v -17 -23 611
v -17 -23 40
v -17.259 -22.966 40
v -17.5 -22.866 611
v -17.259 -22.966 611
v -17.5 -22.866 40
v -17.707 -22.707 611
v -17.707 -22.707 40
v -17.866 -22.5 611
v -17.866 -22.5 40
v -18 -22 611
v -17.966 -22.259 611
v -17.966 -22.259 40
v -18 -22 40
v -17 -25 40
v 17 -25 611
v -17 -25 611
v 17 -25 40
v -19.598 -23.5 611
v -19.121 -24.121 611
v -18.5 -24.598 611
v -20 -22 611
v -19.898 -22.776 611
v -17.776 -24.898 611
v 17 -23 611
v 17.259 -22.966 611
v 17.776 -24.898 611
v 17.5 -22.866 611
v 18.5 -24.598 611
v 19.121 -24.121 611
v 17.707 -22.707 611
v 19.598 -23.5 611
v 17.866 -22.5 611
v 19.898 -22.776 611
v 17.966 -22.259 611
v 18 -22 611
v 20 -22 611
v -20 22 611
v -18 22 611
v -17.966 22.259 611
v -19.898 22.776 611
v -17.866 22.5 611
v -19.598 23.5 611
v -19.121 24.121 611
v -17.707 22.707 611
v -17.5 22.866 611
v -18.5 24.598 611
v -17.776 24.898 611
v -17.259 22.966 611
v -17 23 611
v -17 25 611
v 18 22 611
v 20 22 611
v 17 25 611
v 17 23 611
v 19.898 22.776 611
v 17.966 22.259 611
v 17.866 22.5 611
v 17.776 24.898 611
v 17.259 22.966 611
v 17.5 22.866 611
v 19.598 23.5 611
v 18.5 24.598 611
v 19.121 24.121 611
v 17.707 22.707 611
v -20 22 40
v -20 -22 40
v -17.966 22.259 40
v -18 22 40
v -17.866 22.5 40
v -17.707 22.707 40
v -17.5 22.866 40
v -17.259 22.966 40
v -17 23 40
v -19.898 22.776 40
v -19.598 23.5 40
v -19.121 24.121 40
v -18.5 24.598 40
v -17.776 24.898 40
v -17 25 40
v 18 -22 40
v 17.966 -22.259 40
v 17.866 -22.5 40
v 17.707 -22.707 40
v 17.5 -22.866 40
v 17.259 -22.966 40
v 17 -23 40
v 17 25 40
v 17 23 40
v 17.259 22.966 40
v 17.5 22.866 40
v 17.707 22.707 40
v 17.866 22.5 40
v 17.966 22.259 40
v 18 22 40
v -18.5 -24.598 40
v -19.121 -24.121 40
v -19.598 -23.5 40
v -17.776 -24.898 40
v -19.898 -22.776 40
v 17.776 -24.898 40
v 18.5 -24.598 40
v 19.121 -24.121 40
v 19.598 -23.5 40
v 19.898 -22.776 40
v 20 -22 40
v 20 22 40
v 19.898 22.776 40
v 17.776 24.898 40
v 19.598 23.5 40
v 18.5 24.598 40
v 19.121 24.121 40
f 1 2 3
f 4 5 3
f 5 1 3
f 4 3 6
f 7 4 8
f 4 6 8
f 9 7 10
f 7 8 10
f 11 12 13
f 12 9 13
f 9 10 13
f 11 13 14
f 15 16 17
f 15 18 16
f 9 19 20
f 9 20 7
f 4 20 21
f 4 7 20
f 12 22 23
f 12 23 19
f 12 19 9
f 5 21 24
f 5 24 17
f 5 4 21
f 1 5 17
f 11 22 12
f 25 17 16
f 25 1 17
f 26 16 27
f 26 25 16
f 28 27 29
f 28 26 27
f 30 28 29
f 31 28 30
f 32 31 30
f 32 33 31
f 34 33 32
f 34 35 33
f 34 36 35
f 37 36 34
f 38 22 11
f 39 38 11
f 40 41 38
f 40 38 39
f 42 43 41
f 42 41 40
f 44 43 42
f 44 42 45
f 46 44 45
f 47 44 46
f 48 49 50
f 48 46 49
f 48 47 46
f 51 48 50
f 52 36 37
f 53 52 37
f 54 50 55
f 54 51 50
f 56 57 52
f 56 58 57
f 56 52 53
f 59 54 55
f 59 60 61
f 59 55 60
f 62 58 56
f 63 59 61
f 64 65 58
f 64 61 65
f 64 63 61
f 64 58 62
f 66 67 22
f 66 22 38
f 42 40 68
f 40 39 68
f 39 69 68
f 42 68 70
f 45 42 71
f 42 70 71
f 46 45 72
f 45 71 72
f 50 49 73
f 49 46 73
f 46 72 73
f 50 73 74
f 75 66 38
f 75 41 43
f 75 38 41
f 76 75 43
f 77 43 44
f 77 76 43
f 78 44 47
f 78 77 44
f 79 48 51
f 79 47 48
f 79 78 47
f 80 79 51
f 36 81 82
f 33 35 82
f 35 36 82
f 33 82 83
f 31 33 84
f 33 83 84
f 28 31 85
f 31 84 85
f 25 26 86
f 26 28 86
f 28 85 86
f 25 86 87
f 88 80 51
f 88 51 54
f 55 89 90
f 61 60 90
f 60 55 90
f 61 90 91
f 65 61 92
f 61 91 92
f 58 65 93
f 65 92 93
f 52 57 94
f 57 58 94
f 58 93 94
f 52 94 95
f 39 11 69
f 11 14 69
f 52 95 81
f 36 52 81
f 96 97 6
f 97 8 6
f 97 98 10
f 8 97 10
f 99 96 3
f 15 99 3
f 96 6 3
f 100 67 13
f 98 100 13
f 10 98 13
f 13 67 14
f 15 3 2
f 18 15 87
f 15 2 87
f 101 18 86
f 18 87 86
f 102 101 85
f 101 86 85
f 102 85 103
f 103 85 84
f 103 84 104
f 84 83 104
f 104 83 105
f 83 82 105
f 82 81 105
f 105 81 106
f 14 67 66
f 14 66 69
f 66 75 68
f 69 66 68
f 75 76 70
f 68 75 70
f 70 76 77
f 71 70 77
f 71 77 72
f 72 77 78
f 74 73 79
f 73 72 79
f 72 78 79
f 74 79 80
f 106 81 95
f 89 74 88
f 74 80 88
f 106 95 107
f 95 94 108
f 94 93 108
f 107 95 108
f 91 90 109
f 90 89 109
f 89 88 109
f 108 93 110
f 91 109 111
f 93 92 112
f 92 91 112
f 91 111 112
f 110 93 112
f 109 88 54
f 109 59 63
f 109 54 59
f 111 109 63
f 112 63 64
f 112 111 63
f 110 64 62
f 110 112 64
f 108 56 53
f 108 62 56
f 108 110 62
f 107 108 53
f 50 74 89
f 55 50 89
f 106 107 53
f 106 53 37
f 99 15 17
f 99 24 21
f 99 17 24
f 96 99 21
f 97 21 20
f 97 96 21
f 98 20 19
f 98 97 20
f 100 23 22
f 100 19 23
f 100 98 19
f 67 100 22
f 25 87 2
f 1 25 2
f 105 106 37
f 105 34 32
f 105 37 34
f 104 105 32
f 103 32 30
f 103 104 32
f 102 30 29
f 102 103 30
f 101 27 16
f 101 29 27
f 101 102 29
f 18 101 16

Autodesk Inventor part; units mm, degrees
ref_plane "Start plane" through (0, 0, 40) normal (0, 0, 1) x (1, 0, 0)
ref_plane "End plane" through (0, 0, 611) normal (0, 0, 1) x (1, 0, 0)
sketch "Sketch" plane through (0, 0, 0) normal (0, 0, 1) x (1, 0, 0)
  line L0 (-20, -22) -> (-20, 22)
  line L1 (-17, 25) -> (17, 25)
  line L2 (20, 22) -> (20, -22)
  line L3 (17, -25) -> (-17, -25)
  arc A0 (-20, -22) -> (-17, -25) centre (-17, -22) ccw
  arc A1 (-17, 25) -> (-20, 22) centre (-17, 22) ccw
  arc A2 (20, 22) -> (17, 25) centre (17, 22) ccw
  arc A3 (17, -25) -> (20, -22) centre (17, -22) ccw
  arc A4 (-17, 23) -> (-18, 22) centre (-17, 22) ccw
  line L4 (-17, 23) -> (17, 23)
  arc A5 (18, 22) -> (17, 23) centre (17, 22) ccw
  line L5 (18, 22) -> (18, -22)
  arc A6 (17, -23) -> (18, -22) centre (17, -22) ccw
  line L6 (17, -23) -> (-17, -23)
  arc A7 (-18, -22) -> (-17, -23) centre (-17, -22) ccw
  line L7 (-18, -22) -> (-18, 22)
  line L8 (0, 35.8698) -> (0, -35.8698) construction
  line L9 (-28.8698, 0) -> (28.8698, 0) construction
  dimension "d7" = 3
  dimension "d10" = 50
  dimension "d11" = 40
  dimension "d12" = 2
  dimension "d15" = 25
  dimension "d16" = 20
extrude "Body" add sketch "Sketch" along normal up to surface (571 mm away) from surface at 40
sketch "Sketch3" plane through (0, 0, 0) normal (0, 0, 1) x (1, 0, 0)
  line L0 (0, 0) -> (10, 0)
ref_plane "Work Plane3" through (0, 0, 0) normal (0, -1, 0) x (1, 0, 0)
sketch "Sketch4" plane through (0, 0, 0) normal (0, -1, 0) x (1, 0, 0)
  line L0 (-2, 40) -> (12, 40)
  line L1 (-2, 611) -> (12, 611)
  dimension "d18" = 571
ref_plane "Work Plane4" through (20, 22, 40) normal (0, 0, -1) x (-1, 0, 0)
split "Split1" plane through (20, 22, 40) removes the side toward (0, 0, -1)
ref_plane "Work Plane5" through (20, -22, 611) normal (0, 0, 1) x (1, 0, 0)
split "Split2" plane through (20, -22, 611) removes the side toward (0, 0, 1)
equation "\"d7\" = G_IR"
equation "\"d10\" = G_H"
equation "\"d11\" = G_W"
equation "\"d12\" = G_T"
equation "\"d15\" = 0.5 * d10"
equation "\"d16\" = 0.5 * d11"
equation "\"d3\" = G_L"
equation "\"G_W\" = 40"
equation "\"G_H\" = 50"
equation "\"G_T\" = 2"
equation "\"G_IR\" = 3"
equation "\"G_L\" = d18"
equation "\"G_OFFSET_START\" = -40"
equation "\"G_OFFSET_END\" = -40"
equation "\"d13\" = -G_OFFSET_START"
equation "\"d14\" = G_OFFSET_END + B_L"
equation "\"B_L\" = 651"
properties part number "UNI EN 10305-5 - 50 x 40 x 2  - 571" material "Steel, Mild"
